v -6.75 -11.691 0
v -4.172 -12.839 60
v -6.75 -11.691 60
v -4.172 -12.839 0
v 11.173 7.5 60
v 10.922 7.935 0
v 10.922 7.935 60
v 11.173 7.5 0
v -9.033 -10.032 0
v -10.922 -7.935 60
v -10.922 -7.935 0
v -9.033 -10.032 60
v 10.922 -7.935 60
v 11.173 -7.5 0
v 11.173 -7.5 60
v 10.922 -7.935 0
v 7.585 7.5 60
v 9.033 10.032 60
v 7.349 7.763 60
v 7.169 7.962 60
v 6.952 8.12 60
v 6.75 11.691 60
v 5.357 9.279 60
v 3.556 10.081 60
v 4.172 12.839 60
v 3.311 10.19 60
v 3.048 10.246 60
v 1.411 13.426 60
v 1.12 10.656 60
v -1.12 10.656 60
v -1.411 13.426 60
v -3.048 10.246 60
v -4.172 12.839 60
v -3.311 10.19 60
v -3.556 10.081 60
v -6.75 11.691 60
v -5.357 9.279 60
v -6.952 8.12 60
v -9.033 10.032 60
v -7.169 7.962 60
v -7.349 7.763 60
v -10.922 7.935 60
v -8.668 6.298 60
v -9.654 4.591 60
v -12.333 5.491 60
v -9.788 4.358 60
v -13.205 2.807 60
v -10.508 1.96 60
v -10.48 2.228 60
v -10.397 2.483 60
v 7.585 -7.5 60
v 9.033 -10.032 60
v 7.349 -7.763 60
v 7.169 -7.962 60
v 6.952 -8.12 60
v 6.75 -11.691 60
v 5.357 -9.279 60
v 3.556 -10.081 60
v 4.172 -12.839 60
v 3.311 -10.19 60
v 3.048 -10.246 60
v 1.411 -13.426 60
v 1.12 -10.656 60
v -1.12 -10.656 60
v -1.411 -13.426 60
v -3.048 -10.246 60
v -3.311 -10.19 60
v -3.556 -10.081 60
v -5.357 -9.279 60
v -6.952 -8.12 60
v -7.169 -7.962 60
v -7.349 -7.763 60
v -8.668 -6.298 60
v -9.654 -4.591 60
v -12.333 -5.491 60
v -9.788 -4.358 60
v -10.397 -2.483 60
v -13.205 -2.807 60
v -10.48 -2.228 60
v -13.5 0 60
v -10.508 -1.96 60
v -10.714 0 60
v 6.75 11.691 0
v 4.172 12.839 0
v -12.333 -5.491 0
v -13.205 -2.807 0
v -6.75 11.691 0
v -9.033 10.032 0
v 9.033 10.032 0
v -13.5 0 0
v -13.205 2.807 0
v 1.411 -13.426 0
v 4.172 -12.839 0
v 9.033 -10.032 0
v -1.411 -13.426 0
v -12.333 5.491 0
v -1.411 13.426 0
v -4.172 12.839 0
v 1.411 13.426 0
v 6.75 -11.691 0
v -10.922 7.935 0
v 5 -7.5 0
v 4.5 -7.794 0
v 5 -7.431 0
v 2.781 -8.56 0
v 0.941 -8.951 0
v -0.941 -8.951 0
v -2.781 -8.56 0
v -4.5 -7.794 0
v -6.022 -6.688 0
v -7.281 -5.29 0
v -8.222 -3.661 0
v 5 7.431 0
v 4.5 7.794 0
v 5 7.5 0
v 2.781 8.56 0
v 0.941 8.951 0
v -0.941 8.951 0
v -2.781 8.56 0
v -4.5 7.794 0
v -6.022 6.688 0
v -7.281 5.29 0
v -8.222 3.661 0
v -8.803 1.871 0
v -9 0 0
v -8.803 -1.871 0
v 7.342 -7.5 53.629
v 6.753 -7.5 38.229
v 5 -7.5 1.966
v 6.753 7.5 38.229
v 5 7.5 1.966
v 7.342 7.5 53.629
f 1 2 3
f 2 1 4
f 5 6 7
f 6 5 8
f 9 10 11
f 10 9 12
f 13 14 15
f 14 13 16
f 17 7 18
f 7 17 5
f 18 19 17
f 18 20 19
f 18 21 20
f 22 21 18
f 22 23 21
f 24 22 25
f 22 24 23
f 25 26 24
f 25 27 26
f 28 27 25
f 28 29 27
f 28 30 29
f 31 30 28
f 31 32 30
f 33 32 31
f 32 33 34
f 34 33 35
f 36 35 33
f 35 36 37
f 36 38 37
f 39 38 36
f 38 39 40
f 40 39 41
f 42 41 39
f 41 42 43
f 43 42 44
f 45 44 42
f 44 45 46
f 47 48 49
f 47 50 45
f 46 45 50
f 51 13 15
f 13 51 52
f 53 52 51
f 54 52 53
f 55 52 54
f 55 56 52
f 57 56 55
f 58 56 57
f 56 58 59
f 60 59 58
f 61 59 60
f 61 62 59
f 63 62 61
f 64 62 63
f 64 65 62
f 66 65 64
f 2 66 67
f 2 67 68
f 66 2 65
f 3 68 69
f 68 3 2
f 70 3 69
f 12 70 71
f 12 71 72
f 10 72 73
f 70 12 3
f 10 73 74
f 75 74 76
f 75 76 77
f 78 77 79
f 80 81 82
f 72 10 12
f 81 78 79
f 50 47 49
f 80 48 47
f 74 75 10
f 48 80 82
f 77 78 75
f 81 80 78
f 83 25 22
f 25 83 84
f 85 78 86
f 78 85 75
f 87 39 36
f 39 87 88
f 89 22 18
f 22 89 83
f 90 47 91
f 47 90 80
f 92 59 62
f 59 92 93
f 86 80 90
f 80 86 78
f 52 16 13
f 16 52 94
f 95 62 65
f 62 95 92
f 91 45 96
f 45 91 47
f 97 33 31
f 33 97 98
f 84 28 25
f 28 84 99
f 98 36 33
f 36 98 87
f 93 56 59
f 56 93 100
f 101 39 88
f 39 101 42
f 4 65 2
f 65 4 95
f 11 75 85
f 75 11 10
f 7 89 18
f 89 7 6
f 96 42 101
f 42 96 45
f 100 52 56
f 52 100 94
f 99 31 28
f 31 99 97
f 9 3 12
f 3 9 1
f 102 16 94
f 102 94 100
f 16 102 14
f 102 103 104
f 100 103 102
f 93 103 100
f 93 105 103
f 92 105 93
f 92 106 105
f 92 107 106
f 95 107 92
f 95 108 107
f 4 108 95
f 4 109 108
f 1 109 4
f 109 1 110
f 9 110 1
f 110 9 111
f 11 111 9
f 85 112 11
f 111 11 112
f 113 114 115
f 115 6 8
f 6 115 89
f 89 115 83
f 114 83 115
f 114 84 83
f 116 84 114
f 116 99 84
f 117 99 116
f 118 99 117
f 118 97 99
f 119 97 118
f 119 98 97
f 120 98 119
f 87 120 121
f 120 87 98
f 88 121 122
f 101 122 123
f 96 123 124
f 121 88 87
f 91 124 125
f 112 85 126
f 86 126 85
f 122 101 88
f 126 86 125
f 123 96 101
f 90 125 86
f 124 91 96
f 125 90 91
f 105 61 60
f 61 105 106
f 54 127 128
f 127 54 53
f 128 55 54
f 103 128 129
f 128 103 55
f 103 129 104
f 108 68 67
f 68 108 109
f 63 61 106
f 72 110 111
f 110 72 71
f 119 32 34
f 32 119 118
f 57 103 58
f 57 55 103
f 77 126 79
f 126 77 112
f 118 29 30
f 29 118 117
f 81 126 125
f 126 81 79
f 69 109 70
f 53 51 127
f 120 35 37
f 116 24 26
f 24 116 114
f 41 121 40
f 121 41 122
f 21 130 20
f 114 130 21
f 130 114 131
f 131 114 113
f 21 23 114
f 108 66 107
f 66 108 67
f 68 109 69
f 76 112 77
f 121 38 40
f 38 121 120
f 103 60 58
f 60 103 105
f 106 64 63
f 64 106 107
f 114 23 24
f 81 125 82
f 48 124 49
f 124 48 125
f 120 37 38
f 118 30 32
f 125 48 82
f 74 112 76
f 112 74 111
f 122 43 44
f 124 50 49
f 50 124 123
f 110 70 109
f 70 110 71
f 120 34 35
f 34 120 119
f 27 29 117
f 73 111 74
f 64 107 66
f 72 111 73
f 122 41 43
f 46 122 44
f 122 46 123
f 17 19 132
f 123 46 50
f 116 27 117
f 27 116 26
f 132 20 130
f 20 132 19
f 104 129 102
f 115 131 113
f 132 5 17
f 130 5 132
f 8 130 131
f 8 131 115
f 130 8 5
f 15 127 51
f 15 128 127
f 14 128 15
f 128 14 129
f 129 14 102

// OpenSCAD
// The top piece is based on the Oras oval-shaped socket for shower handles. It's meant to sit pretty tight.

// total length of the piece
length = 60;

// Oras config
orasR = 13.5;

// no-name brand shower head config
socketRbottom = 9;
socketRtop = 11;

difference(){
  // create the cylinder to fit the Oras holder
  cylinder(length, r=orasR);
  // carve out cone socket to fit the shower piece, position it closer to the front to strengthen the back
  #cylinder(length+10, r1=socketRbottom, r2=socketRtop);
  
  // slice open the front for easy insertion
  translate([5,-7.5,0]) cube([15, 15, 70], center = false);
}
